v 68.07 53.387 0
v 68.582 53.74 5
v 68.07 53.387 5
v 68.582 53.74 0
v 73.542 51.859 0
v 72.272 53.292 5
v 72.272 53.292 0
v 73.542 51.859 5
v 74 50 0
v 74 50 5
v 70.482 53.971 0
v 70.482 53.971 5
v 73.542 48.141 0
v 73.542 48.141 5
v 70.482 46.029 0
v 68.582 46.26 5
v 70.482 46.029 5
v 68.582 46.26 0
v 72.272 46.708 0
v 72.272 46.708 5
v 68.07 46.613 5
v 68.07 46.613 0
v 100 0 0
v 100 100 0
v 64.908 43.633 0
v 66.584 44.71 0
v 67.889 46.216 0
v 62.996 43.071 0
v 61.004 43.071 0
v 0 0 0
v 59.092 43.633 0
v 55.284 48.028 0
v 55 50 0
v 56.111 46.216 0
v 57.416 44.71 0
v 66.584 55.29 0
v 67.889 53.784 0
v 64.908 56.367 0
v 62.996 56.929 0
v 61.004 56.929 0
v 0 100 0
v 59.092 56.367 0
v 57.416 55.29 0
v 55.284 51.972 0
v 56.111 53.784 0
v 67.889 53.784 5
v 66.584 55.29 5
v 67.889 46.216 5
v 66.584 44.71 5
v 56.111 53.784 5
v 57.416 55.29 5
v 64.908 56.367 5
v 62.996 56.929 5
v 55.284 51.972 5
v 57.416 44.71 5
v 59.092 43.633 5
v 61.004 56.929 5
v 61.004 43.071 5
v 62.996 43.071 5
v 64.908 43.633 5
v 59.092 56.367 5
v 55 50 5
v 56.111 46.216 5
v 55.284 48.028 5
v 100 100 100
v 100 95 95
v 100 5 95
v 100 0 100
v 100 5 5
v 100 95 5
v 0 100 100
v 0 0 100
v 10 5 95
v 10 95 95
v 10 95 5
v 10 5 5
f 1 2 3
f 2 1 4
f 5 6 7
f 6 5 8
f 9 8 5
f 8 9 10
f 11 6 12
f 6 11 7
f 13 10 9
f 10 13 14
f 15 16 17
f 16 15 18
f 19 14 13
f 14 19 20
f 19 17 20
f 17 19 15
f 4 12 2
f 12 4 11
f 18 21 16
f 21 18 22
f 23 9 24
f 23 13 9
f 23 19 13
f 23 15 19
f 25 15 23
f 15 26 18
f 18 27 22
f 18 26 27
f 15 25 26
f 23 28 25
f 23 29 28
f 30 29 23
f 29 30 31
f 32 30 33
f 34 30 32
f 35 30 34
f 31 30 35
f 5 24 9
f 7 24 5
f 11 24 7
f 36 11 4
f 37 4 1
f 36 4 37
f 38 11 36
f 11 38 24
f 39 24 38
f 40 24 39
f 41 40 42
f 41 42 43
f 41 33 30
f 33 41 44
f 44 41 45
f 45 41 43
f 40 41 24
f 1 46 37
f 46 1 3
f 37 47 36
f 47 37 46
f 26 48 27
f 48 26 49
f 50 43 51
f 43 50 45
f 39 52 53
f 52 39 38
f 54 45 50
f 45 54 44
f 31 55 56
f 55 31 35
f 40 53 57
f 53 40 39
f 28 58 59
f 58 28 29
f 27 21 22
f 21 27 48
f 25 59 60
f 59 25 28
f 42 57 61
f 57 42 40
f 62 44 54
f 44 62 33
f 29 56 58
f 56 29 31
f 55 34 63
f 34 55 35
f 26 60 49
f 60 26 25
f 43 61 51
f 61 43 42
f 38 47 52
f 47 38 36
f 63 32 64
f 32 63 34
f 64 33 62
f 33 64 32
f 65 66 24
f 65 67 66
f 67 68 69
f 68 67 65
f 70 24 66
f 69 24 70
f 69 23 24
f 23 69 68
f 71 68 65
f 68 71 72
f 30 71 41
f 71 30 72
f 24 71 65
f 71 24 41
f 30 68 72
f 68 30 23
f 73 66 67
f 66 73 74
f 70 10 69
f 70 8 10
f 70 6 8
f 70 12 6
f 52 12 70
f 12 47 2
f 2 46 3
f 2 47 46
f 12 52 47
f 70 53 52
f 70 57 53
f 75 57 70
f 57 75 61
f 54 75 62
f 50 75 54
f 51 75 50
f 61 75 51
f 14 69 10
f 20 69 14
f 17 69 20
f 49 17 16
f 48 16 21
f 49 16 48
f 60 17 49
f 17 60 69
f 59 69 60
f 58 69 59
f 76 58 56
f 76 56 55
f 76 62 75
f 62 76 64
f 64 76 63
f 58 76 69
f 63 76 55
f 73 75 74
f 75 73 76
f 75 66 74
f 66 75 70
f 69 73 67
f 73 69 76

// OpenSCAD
// lab kits for rPi and arduino
// (c) 2021 John J. Tran

difference() {
    union() {
      cube([100,100,100]);
    };
    union() {
      translate([10,5,5]) cube([90,90,90]);  
    };
    union() {
      translate([70,50,0]) cylinder(10,4,4);
      translate([62,50,0]) cylinder(10,7,7);        
    }
}
